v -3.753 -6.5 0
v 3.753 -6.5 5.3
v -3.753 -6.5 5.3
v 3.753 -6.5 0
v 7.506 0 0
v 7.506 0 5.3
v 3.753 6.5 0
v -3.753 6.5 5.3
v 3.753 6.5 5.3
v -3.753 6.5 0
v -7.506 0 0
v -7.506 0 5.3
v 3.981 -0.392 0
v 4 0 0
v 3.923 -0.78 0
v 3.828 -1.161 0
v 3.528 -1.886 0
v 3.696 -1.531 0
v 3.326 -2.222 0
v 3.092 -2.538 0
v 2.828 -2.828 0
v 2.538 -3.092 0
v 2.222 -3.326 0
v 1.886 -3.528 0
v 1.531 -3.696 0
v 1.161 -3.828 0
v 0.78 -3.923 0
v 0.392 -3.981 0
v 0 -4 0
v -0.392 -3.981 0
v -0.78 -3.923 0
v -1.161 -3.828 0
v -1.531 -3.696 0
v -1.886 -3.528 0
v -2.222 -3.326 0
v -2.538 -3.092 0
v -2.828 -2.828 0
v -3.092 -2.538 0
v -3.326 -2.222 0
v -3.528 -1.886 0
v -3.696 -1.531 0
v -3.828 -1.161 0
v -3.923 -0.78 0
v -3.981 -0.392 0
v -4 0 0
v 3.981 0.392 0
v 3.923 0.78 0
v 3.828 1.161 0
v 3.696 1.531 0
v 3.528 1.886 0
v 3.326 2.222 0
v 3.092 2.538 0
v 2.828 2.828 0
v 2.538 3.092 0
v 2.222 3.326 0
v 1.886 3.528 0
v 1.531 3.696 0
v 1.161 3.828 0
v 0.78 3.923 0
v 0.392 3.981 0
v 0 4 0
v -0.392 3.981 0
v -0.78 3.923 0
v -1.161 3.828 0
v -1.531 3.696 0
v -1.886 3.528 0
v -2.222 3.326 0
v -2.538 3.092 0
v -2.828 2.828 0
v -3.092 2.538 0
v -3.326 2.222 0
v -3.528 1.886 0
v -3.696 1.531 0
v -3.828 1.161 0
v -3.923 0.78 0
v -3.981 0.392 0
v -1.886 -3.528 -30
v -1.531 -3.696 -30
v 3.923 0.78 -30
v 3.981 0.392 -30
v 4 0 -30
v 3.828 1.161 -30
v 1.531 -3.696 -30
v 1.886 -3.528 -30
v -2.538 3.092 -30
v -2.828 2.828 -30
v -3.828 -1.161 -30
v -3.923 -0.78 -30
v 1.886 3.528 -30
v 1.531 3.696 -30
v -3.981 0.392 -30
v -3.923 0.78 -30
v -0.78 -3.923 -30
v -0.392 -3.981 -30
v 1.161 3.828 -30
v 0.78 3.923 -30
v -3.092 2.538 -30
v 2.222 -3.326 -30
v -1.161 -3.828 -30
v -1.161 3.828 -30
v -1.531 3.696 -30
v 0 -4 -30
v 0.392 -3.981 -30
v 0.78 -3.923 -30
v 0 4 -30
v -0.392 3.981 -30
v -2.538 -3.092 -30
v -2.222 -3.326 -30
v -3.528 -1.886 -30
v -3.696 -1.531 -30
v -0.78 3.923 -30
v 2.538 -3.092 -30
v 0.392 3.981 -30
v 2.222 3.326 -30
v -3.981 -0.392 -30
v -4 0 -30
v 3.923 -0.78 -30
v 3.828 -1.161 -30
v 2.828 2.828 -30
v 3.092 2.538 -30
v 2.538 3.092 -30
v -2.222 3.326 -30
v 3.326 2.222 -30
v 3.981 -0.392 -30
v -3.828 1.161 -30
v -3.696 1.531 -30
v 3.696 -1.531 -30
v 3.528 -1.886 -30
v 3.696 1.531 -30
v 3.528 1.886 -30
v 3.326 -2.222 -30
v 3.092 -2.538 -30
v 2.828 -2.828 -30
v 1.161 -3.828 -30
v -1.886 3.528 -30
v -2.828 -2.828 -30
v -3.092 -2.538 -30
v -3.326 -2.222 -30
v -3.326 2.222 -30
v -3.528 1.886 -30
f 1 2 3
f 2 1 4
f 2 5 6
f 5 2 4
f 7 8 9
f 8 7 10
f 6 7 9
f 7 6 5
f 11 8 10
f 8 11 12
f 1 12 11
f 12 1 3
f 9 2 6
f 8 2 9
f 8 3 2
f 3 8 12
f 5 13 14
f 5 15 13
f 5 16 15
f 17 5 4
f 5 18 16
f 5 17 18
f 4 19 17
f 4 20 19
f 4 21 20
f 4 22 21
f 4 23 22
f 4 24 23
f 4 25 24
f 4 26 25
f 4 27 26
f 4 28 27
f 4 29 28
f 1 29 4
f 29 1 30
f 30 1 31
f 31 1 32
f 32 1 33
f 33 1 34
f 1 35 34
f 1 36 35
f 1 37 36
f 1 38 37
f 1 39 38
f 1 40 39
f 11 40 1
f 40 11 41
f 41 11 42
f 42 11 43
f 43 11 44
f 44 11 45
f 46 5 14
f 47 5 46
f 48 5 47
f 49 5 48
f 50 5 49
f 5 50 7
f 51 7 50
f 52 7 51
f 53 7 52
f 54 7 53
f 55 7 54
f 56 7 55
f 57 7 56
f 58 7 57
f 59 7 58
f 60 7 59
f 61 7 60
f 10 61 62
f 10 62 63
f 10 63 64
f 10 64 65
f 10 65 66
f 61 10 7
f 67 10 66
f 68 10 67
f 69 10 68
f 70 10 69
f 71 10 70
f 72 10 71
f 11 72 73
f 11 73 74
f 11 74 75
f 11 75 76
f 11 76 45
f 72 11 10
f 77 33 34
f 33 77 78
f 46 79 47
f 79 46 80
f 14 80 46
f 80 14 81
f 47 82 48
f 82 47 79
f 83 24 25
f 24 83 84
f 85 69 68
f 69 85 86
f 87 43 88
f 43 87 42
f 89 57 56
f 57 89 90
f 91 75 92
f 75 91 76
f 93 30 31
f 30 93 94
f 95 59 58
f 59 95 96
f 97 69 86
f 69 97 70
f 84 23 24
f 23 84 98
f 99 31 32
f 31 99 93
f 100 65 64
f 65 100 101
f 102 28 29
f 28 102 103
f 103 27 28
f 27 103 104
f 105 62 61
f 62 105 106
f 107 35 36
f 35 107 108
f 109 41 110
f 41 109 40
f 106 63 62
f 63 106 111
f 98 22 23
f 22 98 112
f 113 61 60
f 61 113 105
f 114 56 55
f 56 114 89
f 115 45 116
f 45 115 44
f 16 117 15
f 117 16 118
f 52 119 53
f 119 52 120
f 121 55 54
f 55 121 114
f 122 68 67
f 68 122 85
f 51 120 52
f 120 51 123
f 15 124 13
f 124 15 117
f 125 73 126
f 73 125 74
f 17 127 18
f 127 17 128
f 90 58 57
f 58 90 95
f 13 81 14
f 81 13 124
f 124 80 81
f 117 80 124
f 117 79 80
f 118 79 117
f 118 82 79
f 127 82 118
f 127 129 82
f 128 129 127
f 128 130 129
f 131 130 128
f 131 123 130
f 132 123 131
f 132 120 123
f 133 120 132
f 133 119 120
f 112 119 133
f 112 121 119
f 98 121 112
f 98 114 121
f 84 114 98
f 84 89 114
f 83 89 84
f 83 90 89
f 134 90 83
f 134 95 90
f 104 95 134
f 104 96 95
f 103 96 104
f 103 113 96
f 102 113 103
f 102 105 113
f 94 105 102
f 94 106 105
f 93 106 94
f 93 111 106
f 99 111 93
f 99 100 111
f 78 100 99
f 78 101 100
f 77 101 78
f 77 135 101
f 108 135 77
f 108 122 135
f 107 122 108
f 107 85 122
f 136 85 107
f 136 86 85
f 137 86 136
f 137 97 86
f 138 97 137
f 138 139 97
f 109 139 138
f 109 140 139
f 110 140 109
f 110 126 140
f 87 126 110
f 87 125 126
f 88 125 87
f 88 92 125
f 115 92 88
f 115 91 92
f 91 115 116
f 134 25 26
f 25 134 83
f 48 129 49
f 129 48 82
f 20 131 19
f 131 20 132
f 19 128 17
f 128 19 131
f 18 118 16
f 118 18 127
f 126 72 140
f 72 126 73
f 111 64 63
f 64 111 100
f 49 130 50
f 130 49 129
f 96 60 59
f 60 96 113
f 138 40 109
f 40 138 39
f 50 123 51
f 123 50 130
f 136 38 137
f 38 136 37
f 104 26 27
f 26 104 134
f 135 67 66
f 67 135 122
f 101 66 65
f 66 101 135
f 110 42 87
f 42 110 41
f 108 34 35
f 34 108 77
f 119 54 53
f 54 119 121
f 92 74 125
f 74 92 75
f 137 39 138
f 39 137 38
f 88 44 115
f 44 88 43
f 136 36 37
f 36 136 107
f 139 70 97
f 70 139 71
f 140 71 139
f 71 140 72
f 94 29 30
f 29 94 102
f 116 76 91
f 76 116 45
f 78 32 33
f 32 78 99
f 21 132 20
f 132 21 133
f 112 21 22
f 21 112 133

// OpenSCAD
// M8 hex bolt (simplified, no threads)

// Parameters
across_flats = 13;      // head width across flats (mm)
head_height  = 5.3;     // head height (mm)
shank_dia    = 8;       // shank diameter (mm)
shank_len    = 30;      // shank length (mm)

// Derived: circumscribed circle radius from across-flats
head_radius = across_flats / sqrt(3);

module hex_bolt() {
    // Head: hexagonal prism, bottom at z=0, extends to z=head_height
    translate([0, 0, 0])
        cylinder(h = head_height, r = head_radius, $fn = 6);

    // Shank: cylinder extending downward (z<0)
    translate([0, 0, -shank_len])
        cylinder(h = shank_len, d = shank_dia, $fn = 64);
}

hex_bolt();
